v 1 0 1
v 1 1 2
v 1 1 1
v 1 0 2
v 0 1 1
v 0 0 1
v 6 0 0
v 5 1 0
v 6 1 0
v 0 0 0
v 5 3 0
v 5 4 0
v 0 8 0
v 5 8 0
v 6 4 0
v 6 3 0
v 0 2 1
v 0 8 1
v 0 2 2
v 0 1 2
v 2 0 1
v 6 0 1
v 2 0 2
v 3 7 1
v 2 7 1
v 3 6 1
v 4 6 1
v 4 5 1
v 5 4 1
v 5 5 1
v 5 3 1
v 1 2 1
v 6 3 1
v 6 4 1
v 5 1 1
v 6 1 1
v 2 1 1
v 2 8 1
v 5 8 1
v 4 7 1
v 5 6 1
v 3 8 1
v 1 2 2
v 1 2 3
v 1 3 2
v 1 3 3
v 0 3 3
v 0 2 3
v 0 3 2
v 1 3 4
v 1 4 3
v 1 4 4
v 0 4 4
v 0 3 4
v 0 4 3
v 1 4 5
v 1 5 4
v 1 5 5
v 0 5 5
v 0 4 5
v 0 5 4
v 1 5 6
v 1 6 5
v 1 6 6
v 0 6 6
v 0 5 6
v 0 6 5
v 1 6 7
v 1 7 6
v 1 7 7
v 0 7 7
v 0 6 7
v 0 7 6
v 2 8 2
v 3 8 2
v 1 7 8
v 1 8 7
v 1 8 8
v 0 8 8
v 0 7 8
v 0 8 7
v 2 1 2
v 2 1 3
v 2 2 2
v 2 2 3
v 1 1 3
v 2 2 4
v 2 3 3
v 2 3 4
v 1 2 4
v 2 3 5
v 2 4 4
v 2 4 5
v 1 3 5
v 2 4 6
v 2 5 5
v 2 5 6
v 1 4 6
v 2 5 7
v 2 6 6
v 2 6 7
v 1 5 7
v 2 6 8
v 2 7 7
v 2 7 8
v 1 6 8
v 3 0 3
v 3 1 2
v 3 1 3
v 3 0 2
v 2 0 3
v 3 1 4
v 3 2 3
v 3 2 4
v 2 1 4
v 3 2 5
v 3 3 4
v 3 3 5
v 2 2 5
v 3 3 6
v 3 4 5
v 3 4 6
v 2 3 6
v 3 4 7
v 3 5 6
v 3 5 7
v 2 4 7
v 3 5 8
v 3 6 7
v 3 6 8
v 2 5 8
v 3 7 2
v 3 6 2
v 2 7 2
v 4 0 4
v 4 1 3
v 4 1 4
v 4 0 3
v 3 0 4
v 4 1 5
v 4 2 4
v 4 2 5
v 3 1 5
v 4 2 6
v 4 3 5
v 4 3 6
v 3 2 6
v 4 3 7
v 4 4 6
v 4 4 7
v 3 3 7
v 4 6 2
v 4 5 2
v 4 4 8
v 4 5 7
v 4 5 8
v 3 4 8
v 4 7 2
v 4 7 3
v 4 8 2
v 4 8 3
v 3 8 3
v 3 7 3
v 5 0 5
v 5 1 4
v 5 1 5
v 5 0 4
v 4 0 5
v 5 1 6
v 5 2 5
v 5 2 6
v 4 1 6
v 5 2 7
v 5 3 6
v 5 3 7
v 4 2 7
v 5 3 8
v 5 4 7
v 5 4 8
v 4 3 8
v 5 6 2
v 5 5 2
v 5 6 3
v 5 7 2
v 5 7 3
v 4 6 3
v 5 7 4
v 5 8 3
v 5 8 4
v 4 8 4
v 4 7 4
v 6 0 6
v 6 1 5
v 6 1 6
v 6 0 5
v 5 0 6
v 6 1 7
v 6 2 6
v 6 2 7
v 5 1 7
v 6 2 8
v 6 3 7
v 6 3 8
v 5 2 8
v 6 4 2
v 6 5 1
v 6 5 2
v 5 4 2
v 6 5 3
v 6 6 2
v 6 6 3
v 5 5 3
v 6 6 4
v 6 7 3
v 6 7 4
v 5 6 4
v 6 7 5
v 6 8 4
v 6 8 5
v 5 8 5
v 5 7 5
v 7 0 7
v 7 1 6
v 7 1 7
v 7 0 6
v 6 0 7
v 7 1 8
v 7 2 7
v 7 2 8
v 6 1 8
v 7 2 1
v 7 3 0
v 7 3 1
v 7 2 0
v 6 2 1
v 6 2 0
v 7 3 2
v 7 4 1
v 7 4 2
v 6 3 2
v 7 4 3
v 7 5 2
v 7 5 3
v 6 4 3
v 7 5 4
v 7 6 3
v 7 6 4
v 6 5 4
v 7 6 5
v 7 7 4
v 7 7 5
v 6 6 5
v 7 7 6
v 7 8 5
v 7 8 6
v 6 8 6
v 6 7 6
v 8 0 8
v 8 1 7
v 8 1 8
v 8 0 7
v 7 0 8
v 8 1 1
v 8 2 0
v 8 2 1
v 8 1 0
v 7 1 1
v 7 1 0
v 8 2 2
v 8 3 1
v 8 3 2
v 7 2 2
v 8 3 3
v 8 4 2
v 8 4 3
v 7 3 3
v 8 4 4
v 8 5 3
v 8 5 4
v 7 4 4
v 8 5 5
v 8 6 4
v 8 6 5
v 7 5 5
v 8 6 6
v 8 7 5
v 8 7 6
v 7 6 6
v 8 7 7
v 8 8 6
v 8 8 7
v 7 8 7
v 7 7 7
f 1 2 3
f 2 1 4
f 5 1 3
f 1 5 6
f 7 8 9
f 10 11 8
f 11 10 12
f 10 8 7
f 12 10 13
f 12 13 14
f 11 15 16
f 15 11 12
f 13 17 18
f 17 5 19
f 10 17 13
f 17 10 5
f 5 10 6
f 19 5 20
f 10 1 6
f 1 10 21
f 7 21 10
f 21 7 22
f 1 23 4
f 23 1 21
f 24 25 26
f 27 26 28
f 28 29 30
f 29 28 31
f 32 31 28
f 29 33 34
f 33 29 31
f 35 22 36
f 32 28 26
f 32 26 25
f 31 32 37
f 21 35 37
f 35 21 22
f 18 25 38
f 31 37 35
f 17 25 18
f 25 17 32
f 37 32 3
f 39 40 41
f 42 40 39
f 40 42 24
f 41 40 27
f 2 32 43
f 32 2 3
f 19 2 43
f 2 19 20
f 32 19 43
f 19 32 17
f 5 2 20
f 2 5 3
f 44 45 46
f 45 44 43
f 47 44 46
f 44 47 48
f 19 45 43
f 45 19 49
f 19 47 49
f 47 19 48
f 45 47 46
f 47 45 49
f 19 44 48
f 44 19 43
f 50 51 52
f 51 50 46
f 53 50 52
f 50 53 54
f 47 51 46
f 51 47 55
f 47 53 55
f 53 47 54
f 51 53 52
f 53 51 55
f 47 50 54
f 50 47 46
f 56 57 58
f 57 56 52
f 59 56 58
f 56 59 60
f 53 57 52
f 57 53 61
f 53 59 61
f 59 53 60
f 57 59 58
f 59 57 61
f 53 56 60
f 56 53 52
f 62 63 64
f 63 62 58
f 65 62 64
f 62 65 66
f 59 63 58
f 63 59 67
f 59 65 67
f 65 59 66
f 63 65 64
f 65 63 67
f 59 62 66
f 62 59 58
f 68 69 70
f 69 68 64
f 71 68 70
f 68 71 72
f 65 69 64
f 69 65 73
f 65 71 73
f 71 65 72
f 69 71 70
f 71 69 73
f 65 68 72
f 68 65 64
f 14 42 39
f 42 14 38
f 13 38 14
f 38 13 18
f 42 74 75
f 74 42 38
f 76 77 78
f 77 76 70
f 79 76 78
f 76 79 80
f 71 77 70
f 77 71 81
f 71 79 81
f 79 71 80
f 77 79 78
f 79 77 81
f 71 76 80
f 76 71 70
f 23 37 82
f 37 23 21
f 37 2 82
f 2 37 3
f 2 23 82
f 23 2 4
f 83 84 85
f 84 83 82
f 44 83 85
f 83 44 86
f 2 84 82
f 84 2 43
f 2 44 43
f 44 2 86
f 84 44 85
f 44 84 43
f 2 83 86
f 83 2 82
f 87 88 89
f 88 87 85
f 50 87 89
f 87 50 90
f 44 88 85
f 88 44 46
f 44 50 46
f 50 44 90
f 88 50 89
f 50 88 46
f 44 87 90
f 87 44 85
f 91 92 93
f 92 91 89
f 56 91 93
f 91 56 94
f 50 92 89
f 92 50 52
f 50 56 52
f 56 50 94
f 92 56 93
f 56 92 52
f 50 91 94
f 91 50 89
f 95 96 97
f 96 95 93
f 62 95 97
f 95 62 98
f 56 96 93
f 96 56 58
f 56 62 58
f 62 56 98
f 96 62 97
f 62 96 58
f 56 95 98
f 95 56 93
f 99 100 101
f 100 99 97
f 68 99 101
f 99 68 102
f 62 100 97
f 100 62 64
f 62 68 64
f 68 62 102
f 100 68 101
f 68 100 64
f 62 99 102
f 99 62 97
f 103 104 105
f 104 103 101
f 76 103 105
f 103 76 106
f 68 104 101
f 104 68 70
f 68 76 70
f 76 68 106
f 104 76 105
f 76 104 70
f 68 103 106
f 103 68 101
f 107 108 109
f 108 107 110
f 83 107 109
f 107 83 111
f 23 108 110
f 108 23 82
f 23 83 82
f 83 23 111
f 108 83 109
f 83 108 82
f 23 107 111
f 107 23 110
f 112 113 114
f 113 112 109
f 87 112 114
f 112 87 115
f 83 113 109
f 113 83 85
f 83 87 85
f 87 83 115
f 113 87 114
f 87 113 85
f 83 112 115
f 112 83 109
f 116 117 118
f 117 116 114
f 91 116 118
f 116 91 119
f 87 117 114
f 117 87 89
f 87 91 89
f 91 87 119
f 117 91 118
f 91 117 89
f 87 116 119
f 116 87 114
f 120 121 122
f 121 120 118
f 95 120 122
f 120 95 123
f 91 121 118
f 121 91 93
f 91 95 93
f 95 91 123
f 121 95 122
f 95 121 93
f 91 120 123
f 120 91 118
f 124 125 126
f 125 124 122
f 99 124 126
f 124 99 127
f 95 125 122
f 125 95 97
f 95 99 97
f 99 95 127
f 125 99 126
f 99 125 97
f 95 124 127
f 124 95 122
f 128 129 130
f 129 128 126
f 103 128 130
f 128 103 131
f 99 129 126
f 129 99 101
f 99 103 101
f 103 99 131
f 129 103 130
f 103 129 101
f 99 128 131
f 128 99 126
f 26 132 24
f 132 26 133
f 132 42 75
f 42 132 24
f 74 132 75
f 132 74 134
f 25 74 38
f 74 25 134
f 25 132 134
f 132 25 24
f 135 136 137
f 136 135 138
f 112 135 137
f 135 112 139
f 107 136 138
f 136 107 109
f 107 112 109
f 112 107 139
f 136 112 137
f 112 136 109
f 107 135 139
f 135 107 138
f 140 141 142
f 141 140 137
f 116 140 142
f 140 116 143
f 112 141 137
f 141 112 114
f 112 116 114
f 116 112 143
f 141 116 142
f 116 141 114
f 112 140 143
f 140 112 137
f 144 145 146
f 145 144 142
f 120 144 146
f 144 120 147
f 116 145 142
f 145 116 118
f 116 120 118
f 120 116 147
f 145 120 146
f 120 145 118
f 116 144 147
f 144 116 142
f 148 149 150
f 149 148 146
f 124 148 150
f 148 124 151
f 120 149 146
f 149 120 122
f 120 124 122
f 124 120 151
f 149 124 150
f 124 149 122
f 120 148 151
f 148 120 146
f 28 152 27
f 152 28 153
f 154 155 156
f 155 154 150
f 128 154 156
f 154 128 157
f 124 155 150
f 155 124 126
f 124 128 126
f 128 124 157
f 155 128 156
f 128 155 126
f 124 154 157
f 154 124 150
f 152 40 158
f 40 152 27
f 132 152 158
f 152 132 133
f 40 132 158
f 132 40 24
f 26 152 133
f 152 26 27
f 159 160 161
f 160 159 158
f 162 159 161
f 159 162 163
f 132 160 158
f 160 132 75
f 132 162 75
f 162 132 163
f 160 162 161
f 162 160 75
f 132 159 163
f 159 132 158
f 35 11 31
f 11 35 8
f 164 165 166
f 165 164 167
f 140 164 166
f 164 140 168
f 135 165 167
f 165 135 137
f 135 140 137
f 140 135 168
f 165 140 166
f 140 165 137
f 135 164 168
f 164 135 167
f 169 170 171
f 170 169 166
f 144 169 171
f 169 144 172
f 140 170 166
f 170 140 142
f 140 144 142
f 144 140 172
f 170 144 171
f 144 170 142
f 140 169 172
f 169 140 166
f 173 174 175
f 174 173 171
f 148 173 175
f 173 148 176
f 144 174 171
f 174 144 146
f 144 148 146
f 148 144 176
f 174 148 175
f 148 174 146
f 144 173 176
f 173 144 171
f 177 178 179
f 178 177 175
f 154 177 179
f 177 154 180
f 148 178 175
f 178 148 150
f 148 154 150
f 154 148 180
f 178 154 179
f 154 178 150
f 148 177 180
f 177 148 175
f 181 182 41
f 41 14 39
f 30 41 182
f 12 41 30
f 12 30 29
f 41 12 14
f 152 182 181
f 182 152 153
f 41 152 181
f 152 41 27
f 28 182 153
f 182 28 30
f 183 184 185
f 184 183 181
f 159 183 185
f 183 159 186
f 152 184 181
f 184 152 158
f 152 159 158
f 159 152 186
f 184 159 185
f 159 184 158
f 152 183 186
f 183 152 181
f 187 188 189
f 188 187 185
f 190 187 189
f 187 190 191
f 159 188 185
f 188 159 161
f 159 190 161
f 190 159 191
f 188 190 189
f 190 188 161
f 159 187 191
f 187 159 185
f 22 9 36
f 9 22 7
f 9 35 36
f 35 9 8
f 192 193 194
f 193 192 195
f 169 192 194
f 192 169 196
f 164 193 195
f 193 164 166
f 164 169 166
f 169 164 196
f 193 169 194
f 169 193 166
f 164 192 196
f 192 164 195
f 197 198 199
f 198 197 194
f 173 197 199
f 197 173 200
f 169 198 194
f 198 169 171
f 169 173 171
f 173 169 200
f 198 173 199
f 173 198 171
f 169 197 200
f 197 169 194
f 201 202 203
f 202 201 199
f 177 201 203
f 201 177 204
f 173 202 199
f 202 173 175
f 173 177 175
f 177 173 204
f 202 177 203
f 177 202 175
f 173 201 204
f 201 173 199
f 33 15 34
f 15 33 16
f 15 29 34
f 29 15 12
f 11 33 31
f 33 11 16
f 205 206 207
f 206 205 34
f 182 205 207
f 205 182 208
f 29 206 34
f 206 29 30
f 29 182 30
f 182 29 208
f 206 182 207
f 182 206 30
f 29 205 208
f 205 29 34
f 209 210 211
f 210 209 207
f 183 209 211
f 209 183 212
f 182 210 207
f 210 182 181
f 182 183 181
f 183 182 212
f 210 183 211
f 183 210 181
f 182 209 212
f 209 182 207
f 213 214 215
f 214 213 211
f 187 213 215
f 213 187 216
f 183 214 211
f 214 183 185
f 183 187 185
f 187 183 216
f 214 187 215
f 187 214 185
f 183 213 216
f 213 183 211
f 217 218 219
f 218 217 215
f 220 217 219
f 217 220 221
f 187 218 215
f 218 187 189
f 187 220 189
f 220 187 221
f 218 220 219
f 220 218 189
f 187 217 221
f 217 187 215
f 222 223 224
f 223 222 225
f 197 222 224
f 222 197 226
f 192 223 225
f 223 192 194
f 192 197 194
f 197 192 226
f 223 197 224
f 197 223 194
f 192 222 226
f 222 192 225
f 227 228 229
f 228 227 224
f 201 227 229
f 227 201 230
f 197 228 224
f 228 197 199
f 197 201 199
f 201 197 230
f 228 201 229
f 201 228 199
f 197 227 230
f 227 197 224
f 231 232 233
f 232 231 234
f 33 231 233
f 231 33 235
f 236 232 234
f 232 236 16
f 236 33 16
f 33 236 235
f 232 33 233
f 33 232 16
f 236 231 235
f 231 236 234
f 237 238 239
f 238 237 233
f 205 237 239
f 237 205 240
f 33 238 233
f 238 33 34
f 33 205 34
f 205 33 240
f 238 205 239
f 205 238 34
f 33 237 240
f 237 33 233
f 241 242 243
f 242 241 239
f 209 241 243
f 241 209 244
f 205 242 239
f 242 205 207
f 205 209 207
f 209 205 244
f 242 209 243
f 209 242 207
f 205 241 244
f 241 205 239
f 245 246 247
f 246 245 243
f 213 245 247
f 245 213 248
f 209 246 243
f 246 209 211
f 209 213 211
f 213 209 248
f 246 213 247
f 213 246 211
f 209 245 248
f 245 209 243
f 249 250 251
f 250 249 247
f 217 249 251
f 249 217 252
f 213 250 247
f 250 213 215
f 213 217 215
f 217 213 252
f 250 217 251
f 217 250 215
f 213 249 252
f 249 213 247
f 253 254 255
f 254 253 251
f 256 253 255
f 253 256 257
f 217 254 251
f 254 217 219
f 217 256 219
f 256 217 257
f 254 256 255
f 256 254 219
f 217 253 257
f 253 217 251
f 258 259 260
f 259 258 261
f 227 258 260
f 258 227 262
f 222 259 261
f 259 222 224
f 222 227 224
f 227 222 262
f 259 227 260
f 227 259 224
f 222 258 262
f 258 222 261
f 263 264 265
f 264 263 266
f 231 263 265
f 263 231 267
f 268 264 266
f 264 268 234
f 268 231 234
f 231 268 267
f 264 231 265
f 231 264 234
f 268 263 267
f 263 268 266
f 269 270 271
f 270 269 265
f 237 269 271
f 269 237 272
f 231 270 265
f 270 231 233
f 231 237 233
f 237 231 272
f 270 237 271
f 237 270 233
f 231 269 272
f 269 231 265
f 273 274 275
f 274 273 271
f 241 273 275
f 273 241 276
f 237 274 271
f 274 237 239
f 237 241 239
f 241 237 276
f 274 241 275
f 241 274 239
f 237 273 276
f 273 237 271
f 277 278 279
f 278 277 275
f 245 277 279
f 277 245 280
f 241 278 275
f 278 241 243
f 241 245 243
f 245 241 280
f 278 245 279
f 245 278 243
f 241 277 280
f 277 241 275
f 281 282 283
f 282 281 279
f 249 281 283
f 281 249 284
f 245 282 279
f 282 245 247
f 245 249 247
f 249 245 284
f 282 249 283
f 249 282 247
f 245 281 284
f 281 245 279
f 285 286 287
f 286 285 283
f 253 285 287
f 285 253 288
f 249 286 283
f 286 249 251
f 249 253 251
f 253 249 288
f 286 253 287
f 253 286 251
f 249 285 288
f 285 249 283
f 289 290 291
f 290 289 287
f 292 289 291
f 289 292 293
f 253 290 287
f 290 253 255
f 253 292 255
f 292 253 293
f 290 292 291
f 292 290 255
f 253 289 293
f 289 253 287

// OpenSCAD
union() {
    translate([0.0, 0.0, 0.0]) cube([1, 1, 1]);
    translate([0.0, 1.0, 0.0]) cube([1, 1, 1]);
    translate([0.0, 1.0, 1.0]) cube([1, 1, 1]);
    translate([0.0, 2.0, 0.0]) cube([1, 1, 1]);
    translate([0.0, 2.0, 2.0]) cube([1, 1, 1]);
    translate([0.0, 3.0, 0.0]) cube([1, 1, 1]);
    translate([0.0, 3.0, 3.0]) cube([1, 1, 1]);
    translate([0.0, 4.0, 0.0]) cube([1, 1, 1]);
    translate([0.0, 4.0, 4.0]) cube([1, 1, 1]);
    translate([0.0, 5.0, 0.0]) cube([1, 1, 1]);
    translate([0.0, 5.0, 5.0]) cube([1, 1, 1]);
    translate([0.0, 6.0, 0.0]) cube([1, 1, 1]);
    translate([0.0, 6.0, 6.0]) cube([1, 1, 1]);
    translate([0.0, 7.0, 0.0]) cube([1, 1, 1]);
    translate([0.0, 7.0, 7.0]) cube([1, 1, 1]);
    translate([1.0, 0.0, 0.0]) cube([1, 1, 1]);
    translate([1.0, 0.0, 1.0]) cube([1, 1, 1]);
    translate([1.0, 1.0, 0.0]) cube([1, 1, 1]);
    translate([1.0, 1.0, 2.0]) cube([1, 1, 1]);
    translate([1.0, 2.0, 0.0]) cube([1, 1, 1]);
    translate([1.0, 2.0, 3.0]) cube([1, 1, 1]);
    translate([1.0, 3.0, 0.0]) cube([1, 1, 1]);
    translate([1.0, 3.0, 4.0]) cube([1, 1, 1]);
    translate([1.0, 4.0, 0.0]) cube([1, 1, 1]);
    translate([1.0, 4.0, 5.0]) cube([1, 1, 1]);
    translate([1.0, 5.0, 0.0]) cube([1, 1, 1]);
    translate([1.0, 5.0, 6.0]) cube([1, 1, 1]);
    translate([1.0, 6.0, 0.0]) cube([1, 1, 1]);
    translate([1.0, 6.0, 7.0]) cube([1, 1, 1]);
    translate([1.0, 7.0, 0.0]) cube([1, 1, 1]);
    translate([2.0, 0.0, 0.0]) cube([1, 1, 1]);
    translate([2.0, 0.0, 2.0]) cube([1, 1, 1]);
    translate([2.0, 1.0, 0.0]) cube([1, 1, 1]);
    translate([2.0, 1.0, 3.0]) cube([1, 1, 1]);
    translate([2.0, 2.0, 0.0]) cube([1, 1, 1]);
    translate([2.0, 2.0, 4.0]) cube([1, 1, 1]);
    translate([2.0, 3.0, 0.0]) cube([1, 1, 1]);
    translate([2.0, 3.0, 5.0]) cube([1, 1, 1]);
    translate([2.0, 4.0, 0.0]) cube([1, 1, 1]);
    translate([2.0, 4.0, 6.0]) cube([1, 1, 1]);
    translate([2.0, 5.0, 0.0]) cube([1, 1, 1]);
    translate([2.0, 5.0, 7.0]) cube([1, 1, 1]);
    translate([2.0, 6.0, 0.0]) cube([1, 1, 1]);
    translate([2.0, 7.0, 0.0]) cube([1, 1, 1]);
    translate([2.0, 7.0, 1.0]) cube([1, 1, 1]);
    translate([3.0, 0.0, 0.0]) cube([1, 1, 1]);
    translate([3.0, 0.0, 3.0]) cube([1, 1, 1]);
    translate([3.0, 1.0, 0.0]) cube([1, 1, 1]);
    translate([3.0, 1.0, 4.0]) cube([1, 1, 1]);
    translate([3.0, 2.0, 0.0]) cube([1, 1, 1]);
    translate([3.0, 2.0, 5.0]) cube([1, 1, 1]);
    translate([3.0, 3.0, 0.0]) cube([1, 1, 1]);
    translate([3.0, 3.0, 6.0]) cube([1, 1, 1]);
    translate([3.0, 4.0, 0.0]) cube([1, 1, 1]);
    translate([3.0, 4.0, 7.0]) cube([1, 1, 1]);
    translate([3.0, 5.0, 0.0]) cube([1, 1, 1]);
    translate([3.0, 6.0, 0.0]) cube([1, 1, 1]);
    translate([3.0, 6.0, 1.0]) cube([1, 1, 1]);
    translate([3.0, 7.0, 0.0]) cube([1, 1, 1]);
    translate([3.0, 7.0, 2.0]) cube([1, 1, 1]);
    translate([4.0, 0.0, 0.0]) cube([1, 1, 1]);
    translate([4.0, 0.0, 4.0]) cube([1, 1, 1]);
    translate([4.0, 1.0, 0.0]) cube([1, 1, 1]);
    translate([4.0, 1.0, 5.0]) cube([1, 1, 1]);
    translate([4.0, 2.0, 0.0]) cube([1, 1, 1]);
    translate([4.0, 2.0, 6.0]) cube([1, 1, 1]);
    translate([4.0, 3.0, 0.0]) cube([1, 1, 1]);
    translate([4.0, 3.0, 7.0]) cube([1, 1, 1]);
    translate([4.0, 4.0, 0.0]) cube([1, 1, 1]);
    translate([4.0, 5.0, 0.0]) cube([1, 1, 1]);
    translate([4.0, 5.0, 1.0]) cube([1, 1, 1]);
    translate([4.0, 6.0, 0.0]) cube([1, 1, 1]);
    translate([4.0, 6.0, 2.0]) cube([1, 1, 1]);
    translate([4.0, 7.0, 0.0]) cube([1, 1, 1]);
    translate([4.0, 7.0, 3.0]) cube([1, 1, 1]);
    translate([5.0, 0.0, 0.0]) cube([1, 1, 1]);
    translate([5.0, 0.0, 5.0]) cube([1, 1, 1]);
    translate([5.0, 1.0, 6.0]) cube([1, 1, 1]);
    translate([5.0, 2.0, 7.0]) cube([1, 1, 1]);
    translate([5.0, 3.0, 0.0]) cube([1, 1, 1]);
    translate([5.0, 4.0, 1.0]) cube([1, 1, 1]);
    translate([5.0, 5.0, 2.0]) cube([1, 1, 1]);
    translate([5.0, 6.0, 3.0]) cube([1, 1, 1]);
    translate([5.0, 7.0, 4.0]) cube([1, 1, 1]);
    translate([6.0, 0.0, 6.0]) cube([1, 1, 1]);
    translate([6.0, 1.0, 7.0]) cube([1, 1, 1]);
    translate([6.0, 2.0, 0.0]) cube([1, 1, 1]);
    translate([6.0, 3.0, 1.0]) cube([1, 1, 1]);
    translate([6.0, 4.0, 2.0]) cube([1, 1, 1]);
    translate([6.0, 5.0, 3.0]) cube([1, 1, 1]);
    translate([6.0, 6.0, 4.0]) cube([1, 1, 1]);
    translate([6.0, 7.0, 5.0]) cube([1, 1, 1]);
    translate([7.0, 0.0, 7.0]) cube([1, 1, 1]);
    translate([7.0, 1.0, 0.0]) cube([1, 1, 1]);
    translate([7.0, 2.0, 1.0]) cube([1, 1, 1]);
    translate([7.0, 3.0, 2.0]) cube([1, 1, 1]);
    translate([7.0, 4.0, 3.0]) cube([1, 1, 1]);
    translate([7.0, 5.0, 4.0]) cube([1, 1, 1]);
    translate([7.0, 6.0, 5.0]) cube([1, 1, 1]);
    translate([7.0, 7.0, 6.0]) cube([1, 1, 1]);
}
